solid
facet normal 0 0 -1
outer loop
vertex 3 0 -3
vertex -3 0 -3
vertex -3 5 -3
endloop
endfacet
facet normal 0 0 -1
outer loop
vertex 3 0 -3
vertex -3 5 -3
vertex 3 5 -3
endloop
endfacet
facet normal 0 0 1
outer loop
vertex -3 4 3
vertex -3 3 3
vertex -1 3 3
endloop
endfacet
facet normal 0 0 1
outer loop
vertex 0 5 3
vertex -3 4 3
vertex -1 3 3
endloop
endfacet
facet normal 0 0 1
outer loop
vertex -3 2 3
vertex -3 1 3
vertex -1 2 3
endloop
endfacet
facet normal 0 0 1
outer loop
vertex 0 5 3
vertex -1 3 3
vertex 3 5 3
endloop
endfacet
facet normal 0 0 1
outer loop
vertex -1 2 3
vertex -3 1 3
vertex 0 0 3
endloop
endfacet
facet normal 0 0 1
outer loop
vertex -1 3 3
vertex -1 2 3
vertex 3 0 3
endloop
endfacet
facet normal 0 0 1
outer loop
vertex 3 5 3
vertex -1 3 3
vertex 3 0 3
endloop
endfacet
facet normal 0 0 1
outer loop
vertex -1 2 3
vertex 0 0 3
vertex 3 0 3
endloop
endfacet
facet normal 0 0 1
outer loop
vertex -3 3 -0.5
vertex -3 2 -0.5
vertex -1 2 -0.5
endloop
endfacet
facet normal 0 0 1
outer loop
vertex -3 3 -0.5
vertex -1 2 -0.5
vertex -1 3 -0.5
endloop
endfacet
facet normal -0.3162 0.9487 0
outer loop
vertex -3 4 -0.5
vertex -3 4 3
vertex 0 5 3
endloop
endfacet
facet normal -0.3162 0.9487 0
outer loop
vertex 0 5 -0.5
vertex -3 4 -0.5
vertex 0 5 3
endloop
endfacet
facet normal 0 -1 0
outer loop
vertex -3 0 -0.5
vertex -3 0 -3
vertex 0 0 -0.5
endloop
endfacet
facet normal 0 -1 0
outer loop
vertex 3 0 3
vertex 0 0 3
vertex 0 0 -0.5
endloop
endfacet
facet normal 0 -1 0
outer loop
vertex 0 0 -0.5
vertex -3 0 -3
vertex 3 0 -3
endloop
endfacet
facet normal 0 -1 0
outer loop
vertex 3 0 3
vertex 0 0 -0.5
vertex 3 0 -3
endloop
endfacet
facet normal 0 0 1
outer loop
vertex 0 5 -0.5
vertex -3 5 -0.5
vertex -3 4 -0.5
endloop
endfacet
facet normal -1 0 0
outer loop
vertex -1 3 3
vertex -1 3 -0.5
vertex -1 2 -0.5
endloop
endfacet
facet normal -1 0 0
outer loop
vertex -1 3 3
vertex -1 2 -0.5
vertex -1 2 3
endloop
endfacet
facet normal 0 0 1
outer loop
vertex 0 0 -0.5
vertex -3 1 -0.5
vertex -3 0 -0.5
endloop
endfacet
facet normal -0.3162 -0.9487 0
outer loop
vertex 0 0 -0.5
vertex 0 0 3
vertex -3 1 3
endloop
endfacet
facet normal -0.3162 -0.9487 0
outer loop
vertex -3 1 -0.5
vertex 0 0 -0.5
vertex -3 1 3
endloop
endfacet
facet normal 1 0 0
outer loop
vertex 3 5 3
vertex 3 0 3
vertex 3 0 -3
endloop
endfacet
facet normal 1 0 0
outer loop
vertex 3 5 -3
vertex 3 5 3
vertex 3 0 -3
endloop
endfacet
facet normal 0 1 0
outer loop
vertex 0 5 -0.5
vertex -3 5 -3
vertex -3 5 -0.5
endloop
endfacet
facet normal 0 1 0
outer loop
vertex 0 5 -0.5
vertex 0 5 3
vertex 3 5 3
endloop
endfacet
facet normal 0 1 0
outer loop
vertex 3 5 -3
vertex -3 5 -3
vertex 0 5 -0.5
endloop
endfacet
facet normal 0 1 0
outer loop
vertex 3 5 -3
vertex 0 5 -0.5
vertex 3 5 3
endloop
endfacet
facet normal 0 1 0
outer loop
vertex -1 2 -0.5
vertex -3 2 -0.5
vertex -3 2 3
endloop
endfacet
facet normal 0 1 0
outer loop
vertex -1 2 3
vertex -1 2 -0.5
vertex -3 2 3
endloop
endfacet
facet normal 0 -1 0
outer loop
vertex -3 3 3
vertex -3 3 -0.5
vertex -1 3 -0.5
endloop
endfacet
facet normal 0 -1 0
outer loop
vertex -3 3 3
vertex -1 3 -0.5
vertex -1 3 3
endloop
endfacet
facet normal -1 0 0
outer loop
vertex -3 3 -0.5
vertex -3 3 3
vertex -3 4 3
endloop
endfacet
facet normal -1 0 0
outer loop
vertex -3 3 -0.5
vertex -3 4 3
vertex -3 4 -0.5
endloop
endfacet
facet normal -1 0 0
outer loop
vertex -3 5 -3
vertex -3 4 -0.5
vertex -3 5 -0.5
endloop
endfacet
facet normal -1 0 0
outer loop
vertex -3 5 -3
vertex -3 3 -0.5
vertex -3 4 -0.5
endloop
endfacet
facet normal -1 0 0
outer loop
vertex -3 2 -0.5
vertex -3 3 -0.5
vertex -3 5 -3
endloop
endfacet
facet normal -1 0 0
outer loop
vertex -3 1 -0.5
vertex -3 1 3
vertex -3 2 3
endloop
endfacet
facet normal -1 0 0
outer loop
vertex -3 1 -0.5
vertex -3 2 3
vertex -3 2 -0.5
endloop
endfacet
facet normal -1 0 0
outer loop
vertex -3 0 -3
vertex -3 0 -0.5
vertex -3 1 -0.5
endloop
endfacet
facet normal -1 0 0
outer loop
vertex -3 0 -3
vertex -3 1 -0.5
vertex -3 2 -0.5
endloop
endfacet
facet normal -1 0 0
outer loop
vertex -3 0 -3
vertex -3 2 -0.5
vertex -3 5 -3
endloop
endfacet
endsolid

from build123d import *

# Parameters (mm, degrees)
SKETCH1_W           = 6
SKETCH1_H           = 6
BOSS_EXTRUDE1_DEPTH = 5
SKETCH2_W           = 3.5
SKETCH2_H           = 1
CUT_EXTRUDE1_DEPTH  = 2
CUT_EXTRUDE2_DEPTH  = 3.5


with BuildPart() as part:
    # Sketch1 → Boss-Extrude1 (new body)
    with BuildSketch(Plane(origin=(0, 0, 0), x_dir=(1, 0, 0), z_dir=(0, 1, 0))):
        Rectangle(SKETCH1_W, SKETCH1_H)
    extrude(amount=BOSS_EXTRUDE1_DEPTH)

    # Sketch2 → Cut-Extrude1 (cut)
    with BuildSketch(Plane.ZY.offset(3)):
        with Locations((1.25, 2.5)):
            Rectangle(SKETCH2_W, SKETCH2_H)
    extrude(amount=-CUT_EXTRUDE1_DEPTH, mode=Mode.SUBTRACT)

    # Sketch3 → Cut-Extrude2 (cut)
    with BuildSketch(Plane.XY.offset(3)):
        Polygon((-3, 5), (-3, 4), (0, 5), align=None)
        Polygon((-3, 0), (0, 0), (-3, 1), align=None)
    extrude(amount=-CUT_EXTRUDE2_DEPTH, mode=Mode.SUBTRACT)


solid = part.part
